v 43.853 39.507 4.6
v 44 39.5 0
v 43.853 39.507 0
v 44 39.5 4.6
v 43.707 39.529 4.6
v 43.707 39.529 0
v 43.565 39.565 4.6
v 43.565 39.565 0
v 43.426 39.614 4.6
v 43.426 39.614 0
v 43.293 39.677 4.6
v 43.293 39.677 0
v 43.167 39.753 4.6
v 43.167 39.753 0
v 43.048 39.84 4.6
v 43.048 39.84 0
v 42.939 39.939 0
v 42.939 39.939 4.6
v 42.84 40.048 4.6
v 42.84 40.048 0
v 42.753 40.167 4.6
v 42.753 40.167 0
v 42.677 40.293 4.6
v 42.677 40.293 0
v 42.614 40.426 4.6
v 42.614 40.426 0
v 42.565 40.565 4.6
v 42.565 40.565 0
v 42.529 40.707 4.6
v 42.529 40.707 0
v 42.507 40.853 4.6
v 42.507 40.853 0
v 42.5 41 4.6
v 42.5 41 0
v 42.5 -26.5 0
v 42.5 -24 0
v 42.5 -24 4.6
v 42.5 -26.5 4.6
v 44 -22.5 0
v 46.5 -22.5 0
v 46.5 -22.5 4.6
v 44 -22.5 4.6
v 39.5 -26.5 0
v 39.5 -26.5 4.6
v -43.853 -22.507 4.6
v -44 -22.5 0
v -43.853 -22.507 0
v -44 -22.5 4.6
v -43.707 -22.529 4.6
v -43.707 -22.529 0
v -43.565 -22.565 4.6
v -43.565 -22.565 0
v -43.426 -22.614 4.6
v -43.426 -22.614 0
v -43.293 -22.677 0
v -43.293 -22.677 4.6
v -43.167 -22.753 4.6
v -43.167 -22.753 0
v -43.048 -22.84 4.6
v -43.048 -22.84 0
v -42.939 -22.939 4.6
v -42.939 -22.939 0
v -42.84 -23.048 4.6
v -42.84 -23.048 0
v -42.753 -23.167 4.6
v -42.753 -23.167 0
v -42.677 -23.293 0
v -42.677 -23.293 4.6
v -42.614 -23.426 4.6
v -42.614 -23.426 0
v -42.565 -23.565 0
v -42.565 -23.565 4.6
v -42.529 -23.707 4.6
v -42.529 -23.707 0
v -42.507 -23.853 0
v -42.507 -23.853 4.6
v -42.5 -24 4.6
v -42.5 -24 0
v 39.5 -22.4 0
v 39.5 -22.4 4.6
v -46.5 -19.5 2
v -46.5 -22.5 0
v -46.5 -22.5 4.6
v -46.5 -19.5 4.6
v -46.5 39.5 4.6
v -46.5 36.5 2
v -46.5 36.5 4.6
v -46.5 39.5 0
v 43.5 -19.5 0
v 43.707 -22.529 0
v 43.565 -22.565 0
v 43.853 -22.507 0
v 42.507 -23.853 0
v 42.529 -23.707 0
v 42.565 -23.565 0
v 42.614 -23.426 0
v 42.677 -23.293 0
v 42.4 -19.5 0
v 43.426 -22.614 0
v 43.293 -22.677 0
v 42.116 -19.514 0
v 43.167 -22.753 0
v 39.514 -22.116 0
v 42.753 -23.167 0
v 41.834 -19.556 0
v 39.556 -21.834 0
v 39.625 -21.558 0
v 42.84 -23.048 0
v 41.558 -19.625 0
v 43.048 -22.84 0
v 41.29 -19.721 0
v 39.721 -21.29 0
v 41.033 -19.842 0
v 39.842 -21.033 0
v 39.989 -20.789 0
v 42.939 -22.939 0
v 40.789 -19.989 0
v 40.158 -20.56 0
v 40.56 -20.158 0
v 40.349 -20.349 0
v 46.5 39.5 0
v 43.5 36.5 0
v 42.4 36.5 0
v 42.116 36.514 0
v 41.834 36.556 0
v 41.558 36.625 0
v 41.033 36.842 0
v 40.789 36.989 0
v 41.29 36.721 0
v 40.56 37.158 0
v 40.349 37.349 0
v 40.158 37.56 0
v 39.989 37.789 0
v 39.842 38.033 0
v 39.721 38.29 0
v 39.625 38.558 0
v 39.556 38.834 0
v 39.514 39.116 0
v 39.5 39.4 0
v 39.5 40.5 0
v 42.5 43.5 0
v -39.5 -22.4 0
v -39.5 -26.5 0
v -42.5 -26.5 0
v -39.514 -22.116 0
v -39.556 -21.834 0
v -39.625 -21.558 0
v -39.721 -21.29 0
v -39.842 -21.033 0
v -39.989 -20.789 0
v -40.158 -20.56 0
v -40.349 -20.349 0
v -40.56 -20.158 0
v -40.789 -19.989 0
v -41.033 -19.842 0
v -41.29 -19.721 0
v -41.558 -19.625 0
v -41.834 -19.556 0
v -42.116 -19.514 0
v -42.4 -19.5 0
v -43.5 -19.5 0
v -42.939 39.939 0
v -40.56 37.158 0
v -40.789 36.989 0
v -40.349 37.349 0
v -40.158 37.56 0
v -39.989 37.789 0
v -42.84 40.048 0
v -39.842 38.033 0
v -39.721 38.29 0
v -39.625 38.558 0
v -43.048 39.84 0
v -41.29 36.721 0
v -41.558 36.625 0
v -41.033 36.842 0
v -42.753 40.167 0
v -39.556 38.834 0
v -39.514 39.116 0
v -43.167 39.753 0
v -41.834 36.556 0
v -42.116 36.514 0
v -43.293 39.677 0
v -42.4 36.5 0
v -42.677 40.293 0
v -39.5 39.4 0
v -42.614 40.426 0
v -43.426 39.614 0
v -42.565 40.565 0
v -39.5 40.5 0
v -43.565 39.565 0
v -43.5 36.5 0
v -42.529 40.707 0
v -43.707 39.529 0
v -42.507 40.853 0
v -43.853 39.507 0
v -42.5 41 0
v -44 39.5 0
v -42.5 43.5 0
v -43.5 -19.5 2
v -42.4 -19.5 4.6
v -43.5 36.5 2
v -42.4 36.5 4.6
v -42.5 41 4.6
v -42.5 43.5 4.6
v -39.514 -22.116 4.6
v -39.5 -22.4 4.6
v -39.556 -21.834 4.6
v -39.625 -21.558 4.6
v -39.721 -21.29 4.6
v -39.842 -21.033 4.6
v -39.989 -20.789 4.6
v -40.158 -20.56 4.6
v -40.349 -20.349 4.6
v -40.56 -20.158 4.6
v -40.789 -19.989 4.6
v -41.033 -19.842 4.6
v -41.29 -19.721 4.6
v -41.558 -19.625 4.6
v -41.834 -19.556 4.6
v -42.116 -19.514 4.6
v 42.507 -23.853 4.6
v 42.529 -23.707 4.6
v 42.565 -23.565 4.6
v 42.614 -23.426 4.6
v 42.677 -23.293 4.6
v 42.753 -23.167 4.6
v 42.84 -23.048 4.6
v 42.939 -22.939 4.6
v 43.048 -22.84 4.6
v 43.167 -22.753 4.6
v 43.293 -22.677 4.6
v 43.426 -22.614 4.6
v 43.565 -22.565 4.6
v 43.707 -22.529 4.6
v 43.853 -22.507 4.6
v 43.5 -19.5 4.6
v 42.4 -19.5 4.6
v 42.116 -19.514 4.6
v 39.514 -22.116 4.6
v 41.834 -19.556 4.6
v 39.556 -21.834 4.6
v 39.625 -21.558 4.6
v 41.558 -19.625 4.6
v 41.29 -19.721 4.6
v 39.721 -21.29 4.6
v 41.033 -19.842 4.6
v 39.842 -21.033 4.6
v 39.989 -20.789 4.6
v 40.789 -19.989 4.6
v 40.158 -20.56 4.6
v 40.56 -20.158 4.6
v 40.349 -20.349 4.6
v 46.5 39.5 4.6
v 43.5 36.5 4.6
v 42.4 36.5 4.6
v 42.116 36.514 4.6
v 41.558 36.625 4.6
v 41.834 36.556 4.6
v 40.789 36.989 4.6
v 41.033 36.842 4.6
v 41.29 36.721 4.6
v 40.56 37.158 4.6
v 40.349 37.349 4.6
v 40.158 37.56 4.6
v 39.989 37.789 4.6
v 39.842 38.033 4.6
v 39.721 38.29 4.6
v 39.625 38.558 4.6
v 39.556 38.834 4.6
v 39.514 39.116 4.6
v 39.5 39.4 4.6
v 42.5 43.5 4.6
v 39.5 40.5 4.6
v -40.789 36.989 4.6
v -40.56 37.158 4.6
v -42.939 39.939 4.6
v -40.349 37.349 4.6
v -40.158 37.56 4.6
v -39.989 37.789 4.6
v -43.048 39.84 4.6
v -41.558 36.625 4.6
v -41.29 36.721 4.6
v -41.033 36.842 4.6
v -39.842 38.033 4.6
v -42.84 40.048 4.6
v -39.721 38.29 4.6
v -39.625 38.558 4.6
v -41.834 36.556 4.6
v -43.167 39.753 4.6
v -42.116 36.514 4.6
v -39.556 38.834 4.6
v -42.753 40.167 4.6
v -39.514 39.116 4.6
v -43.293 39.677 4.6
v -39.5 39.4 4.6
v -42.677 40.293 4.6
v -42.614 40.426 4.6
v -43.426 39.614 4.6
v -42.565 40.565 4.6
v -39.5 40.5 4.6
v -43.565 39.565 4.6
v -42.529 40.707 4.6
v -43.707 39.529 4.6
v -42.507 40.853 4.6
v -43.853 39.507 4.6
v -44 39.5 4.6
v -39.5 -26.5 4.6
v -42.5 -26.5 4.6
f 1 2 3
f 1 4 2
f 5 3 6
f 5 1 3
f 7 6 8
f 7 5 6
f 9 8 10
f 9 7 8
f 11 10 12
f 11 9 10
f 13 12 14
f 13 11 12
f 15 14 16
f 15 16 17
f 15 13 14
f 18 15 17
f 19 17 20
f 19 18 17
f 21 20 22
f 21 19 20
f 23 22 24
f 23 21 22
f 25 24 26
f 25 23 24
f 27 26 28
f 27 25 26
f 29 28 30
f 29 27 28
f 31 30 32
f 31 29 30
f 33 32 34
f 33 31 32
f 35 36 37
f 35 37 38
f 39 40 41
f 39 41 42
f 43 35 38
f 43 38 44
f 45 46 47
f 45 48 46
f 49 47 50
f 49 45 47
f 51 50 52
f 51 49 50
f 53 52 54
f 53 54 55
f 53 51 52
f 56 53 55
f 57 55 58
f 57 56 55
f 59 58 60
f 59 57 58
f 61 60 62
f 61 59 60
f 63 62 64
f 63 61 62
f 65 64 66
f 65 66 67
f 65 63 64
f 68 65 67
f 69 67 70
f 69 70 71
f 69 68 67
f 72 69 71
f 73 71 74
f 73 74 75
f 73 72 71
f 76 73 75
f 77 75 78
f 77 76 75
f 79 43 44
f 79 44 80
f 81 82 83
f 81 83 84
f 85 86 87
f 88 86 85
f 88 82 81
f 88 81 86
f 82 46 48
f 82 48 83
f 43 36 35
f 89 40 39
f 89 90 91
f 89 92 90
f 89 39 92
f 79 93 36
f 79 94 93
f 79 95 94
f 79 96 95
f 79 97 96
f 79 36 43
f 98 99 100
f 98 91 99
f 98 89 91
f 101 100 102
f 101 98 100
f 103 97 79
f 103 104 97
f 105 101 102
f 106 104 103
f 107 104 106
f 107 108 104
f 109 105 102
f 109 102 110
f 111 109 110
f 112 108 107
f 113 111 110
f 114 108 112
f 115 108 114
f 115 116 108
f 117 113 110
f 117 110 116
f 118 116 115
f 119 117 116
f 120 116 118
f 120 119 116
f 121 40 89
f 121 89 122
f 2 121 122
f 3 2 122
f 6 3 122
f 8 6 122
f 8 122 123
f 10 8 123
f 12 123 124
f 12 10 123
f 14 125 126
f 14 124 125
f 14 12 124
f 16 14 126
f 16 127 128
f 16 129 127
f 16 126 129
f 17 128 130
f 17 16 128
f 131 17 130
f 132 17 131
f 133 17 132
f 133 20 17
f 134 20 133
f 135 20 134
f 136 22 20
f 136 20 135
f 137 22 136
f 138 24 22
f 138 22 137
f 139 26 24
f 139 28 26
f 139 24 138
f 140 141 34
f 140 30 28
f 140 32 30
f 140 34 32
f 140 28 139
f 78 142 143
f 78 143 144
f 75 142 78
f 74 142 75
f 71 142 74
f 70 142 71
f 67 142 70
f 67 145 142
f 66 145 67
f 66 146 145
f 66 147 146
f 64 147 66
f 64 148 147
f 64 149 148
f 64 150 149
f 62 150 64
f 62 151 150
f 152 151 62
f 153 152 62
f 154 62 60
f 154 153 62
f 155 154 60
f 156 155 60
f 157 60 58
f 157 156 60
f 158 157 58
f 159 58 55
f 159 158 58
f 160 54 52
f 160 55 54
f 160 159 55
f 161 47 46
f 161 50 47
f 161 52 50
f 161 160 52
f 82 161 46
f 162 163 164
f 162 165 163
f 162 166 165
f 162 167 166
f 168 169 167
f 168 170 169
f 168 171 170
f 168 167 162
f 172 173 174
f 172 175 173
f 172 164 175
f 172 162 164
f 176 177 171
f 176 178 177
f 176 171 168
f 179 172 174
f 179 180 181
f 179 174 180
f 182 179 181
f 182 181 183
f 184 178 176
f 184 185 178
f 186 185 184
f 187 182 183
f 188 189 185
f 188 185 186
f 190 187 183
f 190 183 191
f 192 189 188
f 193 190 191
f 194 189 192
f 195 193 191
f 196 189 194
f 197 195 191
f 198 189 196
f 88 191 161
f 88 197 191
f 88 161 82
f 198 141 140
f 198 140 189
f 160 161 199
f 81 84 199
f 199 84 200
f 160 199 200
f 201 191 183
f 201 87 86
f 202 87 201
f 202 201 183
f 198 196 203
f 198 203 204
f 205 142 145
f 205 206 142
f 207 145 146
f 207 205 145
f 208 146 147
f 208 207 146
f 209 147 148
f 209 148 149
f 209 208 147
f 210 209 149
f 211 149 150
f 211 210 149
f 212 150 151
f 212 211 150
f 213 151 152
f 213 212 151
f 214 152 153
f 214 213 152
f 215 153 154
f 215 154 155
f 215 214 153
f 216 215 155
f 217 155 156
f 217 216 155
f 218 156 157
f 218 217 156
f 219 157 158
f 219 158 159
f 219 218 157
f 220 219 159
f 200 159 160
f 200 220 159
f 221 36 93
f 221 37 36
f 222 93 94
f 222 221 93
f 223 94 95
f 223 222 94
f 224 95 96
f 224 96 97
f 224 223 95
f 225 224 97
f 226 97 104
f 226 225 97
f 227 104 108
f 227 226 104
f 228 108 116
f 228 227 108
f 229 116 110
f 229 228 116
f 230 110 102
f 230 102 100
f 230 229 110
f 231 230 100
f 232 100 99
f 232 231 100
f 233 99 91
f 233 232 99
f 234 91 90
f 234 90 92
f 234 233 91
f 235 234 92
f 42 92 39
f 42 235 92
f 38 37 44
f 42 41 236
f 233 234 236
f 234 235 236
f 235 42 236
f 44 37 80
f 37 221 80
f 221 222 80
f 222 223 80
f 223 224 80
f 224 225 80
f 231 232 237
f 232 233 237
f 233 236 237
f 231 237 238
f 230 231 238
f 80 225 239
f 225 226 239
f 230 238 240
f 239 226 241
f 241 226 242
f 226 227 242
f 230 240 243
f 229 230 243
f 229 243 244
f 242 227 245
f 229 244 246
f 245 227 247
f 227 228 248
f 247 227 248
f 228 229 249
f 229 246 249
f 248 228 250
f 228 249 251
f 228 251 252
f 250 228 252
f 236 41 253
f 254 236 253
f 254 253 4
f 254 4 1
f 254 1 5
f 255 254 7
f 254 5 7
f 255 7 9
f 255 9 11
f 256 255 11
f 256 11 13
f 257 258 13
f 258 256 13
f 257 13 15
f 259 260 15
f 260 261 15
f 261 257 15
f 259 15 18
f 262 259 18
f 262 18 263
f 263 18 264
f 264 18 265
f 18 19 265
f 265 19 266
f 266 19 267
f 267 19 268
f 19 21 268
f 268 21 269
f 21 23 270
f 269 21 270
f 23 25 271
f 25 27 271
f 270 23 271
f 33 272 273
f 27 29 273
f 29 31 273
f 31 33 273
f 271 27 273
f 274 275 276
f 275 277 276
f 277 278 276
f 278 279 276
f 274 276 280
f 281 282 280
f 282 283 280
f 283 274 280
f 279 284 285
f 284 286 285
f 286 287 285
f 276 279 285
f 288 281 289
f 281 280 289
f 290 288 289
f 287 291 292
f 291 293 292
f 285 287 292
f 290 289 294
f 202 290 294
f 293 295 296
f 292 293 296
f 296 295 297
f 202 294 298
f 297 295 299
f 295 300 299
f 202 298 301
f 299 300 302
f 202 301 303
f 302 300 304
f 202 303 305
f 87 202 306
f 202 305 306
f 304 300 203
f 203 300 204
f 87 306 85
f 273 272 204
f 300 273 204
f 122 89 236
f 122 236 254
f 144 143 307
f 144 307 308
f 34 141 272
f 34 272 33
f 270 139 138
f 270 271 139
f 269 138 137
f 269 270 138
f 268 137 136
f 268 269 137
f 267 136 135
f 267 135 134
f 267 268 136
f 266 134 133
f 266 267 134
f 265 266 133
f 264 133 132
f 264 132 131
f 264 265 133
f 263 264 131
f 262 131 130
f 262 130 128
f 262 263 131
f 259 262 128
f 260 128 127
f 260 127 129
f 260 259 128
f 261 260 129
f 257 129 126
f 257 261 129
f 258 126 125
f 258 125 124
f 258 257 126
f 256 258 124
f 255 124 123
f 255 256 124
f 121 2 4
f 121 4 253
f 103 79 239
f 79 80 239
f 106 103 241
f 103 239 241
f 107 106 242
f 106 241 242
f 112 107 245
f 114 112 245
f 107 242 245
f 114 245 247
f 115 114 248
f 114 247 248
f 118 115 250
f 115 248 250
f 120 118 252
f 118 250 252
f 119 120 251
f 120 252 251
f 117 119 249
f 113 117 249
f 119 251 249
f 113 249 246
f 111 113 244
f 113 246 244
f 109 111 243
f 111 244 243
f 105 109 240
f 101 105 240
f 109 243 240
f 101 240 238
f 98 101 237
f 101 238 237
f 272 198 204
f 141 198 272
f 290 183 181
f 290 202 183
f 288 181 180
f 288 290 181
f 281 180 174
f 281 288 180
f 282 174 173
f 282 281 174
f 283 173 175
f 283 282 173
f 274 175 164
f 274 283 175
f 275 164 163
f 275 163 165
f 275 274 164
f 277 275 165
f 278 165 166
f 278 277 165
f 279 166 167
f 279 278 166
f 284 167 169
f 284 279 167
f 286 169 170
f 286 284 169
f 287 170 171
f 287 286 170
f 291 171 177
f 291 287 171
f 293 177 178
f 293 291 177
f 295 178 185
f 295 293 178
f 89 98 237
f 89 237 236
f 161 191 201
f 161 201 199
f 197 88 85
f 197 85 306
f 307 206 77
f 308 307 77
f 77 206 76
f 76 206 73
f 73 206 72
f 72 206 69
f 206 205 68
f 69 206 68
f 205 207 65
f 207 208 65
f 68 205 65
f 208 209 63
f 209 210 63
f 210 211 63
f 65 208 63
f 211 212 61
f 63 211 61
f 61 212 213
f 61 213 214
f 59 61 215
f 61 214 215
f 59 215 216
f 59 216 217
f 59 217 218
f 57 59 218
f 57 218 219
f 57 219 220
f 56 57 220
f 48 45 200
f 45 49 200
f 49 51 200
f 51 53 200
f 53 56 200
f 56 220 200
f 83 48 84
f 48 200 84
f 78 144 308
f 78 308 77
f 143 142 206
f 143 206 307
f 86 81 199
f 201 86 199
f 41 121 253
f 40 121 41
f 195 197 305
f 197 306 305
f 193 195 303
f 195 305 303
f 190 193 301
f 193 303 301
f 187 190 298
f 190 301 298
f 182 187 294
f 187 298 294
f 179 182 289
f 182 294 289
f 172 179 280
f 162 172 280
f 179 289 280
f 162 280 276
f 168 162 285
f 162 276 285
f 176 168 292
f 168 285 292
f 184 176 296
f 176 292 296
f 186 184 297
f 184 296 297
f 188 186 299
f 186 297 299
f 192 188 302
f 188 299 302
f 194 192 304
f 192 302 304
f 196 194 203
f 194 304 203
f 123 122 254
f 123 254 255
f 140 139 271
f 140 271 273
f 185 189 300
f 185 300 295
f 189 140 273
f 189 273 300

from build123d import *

# Parameters (mm, degrees)
PAD001_DEPTH   = 4.6
SKETCH001003_W = 3
SKETCH001003_H = 56
POCKET_DEPTH   = 2.6
FILLET_R       = 1.5
FILLET001_R    = 2.9


with BuildPart() as part:
    # Sketch001002 → Pad001 (new body)
    with BuildSketch(Plane.XY):
        Polygon((-46.5, 39.5), (-42.5, 39.5), (-42.5, 43.5), (42.5, 43.5), (42.5, 39.5), (46.5, 39.5), (46.5, -22.5), (42.5, -22.5), (42.5, -26.5), (39.5, -26.5), (39.5, -19.5), (43.5, -19.5), (43.5, 36.5), (39.5, 36.5), (39.5, 40.5), (-39.5, 40.5), (-39.5, 36.5), (-43.5, 36.5), (-43.5, -19.5), (-39.5, -19.5), (-39.5, -26.5), (-42.5, -26.5), (-42.5, -22.5), (-46.5, -22.5), align=None)
    extrude(amount=PAD001_DEPTH)

    # Sketch001003 → Pocket (cut)
    with BuildSketch(Plane.XY.offset(4.6)):
        with Locations((-45, 8.5)):
            Rectangle(SKETCH001003_W, SKETCH001003_H)
    extrude(amount=-POCKET_DEPTH, mode=Mode.SUBTRACT)

    # Fillet
    fillet_edges = [part.edges().sort_by_distance(p)[0] for p in [
        (42.5, -22.5, 2.3),
        (42.5, 39.5, 2.3),
        (-42.5, 39.5, 2.3),
        (-42.5, -22.5, 2.3),
    ]]
    fillet(fillet_edges, radius=FILLET_R)

    # Fillet001
    fillet001_edges = [part.edges().sort_by_distance(p)[0] for p in [
        (39.5, 36.5, 2.3),
        (39.5, -19.5, 2.3),
        (-39.5, 36.5, 2.3),
        (-39.5, -19.5, 2.3),
    ]]
    fillet(fillet001_edges, radius=FILLET001_R)


solid = part.part
